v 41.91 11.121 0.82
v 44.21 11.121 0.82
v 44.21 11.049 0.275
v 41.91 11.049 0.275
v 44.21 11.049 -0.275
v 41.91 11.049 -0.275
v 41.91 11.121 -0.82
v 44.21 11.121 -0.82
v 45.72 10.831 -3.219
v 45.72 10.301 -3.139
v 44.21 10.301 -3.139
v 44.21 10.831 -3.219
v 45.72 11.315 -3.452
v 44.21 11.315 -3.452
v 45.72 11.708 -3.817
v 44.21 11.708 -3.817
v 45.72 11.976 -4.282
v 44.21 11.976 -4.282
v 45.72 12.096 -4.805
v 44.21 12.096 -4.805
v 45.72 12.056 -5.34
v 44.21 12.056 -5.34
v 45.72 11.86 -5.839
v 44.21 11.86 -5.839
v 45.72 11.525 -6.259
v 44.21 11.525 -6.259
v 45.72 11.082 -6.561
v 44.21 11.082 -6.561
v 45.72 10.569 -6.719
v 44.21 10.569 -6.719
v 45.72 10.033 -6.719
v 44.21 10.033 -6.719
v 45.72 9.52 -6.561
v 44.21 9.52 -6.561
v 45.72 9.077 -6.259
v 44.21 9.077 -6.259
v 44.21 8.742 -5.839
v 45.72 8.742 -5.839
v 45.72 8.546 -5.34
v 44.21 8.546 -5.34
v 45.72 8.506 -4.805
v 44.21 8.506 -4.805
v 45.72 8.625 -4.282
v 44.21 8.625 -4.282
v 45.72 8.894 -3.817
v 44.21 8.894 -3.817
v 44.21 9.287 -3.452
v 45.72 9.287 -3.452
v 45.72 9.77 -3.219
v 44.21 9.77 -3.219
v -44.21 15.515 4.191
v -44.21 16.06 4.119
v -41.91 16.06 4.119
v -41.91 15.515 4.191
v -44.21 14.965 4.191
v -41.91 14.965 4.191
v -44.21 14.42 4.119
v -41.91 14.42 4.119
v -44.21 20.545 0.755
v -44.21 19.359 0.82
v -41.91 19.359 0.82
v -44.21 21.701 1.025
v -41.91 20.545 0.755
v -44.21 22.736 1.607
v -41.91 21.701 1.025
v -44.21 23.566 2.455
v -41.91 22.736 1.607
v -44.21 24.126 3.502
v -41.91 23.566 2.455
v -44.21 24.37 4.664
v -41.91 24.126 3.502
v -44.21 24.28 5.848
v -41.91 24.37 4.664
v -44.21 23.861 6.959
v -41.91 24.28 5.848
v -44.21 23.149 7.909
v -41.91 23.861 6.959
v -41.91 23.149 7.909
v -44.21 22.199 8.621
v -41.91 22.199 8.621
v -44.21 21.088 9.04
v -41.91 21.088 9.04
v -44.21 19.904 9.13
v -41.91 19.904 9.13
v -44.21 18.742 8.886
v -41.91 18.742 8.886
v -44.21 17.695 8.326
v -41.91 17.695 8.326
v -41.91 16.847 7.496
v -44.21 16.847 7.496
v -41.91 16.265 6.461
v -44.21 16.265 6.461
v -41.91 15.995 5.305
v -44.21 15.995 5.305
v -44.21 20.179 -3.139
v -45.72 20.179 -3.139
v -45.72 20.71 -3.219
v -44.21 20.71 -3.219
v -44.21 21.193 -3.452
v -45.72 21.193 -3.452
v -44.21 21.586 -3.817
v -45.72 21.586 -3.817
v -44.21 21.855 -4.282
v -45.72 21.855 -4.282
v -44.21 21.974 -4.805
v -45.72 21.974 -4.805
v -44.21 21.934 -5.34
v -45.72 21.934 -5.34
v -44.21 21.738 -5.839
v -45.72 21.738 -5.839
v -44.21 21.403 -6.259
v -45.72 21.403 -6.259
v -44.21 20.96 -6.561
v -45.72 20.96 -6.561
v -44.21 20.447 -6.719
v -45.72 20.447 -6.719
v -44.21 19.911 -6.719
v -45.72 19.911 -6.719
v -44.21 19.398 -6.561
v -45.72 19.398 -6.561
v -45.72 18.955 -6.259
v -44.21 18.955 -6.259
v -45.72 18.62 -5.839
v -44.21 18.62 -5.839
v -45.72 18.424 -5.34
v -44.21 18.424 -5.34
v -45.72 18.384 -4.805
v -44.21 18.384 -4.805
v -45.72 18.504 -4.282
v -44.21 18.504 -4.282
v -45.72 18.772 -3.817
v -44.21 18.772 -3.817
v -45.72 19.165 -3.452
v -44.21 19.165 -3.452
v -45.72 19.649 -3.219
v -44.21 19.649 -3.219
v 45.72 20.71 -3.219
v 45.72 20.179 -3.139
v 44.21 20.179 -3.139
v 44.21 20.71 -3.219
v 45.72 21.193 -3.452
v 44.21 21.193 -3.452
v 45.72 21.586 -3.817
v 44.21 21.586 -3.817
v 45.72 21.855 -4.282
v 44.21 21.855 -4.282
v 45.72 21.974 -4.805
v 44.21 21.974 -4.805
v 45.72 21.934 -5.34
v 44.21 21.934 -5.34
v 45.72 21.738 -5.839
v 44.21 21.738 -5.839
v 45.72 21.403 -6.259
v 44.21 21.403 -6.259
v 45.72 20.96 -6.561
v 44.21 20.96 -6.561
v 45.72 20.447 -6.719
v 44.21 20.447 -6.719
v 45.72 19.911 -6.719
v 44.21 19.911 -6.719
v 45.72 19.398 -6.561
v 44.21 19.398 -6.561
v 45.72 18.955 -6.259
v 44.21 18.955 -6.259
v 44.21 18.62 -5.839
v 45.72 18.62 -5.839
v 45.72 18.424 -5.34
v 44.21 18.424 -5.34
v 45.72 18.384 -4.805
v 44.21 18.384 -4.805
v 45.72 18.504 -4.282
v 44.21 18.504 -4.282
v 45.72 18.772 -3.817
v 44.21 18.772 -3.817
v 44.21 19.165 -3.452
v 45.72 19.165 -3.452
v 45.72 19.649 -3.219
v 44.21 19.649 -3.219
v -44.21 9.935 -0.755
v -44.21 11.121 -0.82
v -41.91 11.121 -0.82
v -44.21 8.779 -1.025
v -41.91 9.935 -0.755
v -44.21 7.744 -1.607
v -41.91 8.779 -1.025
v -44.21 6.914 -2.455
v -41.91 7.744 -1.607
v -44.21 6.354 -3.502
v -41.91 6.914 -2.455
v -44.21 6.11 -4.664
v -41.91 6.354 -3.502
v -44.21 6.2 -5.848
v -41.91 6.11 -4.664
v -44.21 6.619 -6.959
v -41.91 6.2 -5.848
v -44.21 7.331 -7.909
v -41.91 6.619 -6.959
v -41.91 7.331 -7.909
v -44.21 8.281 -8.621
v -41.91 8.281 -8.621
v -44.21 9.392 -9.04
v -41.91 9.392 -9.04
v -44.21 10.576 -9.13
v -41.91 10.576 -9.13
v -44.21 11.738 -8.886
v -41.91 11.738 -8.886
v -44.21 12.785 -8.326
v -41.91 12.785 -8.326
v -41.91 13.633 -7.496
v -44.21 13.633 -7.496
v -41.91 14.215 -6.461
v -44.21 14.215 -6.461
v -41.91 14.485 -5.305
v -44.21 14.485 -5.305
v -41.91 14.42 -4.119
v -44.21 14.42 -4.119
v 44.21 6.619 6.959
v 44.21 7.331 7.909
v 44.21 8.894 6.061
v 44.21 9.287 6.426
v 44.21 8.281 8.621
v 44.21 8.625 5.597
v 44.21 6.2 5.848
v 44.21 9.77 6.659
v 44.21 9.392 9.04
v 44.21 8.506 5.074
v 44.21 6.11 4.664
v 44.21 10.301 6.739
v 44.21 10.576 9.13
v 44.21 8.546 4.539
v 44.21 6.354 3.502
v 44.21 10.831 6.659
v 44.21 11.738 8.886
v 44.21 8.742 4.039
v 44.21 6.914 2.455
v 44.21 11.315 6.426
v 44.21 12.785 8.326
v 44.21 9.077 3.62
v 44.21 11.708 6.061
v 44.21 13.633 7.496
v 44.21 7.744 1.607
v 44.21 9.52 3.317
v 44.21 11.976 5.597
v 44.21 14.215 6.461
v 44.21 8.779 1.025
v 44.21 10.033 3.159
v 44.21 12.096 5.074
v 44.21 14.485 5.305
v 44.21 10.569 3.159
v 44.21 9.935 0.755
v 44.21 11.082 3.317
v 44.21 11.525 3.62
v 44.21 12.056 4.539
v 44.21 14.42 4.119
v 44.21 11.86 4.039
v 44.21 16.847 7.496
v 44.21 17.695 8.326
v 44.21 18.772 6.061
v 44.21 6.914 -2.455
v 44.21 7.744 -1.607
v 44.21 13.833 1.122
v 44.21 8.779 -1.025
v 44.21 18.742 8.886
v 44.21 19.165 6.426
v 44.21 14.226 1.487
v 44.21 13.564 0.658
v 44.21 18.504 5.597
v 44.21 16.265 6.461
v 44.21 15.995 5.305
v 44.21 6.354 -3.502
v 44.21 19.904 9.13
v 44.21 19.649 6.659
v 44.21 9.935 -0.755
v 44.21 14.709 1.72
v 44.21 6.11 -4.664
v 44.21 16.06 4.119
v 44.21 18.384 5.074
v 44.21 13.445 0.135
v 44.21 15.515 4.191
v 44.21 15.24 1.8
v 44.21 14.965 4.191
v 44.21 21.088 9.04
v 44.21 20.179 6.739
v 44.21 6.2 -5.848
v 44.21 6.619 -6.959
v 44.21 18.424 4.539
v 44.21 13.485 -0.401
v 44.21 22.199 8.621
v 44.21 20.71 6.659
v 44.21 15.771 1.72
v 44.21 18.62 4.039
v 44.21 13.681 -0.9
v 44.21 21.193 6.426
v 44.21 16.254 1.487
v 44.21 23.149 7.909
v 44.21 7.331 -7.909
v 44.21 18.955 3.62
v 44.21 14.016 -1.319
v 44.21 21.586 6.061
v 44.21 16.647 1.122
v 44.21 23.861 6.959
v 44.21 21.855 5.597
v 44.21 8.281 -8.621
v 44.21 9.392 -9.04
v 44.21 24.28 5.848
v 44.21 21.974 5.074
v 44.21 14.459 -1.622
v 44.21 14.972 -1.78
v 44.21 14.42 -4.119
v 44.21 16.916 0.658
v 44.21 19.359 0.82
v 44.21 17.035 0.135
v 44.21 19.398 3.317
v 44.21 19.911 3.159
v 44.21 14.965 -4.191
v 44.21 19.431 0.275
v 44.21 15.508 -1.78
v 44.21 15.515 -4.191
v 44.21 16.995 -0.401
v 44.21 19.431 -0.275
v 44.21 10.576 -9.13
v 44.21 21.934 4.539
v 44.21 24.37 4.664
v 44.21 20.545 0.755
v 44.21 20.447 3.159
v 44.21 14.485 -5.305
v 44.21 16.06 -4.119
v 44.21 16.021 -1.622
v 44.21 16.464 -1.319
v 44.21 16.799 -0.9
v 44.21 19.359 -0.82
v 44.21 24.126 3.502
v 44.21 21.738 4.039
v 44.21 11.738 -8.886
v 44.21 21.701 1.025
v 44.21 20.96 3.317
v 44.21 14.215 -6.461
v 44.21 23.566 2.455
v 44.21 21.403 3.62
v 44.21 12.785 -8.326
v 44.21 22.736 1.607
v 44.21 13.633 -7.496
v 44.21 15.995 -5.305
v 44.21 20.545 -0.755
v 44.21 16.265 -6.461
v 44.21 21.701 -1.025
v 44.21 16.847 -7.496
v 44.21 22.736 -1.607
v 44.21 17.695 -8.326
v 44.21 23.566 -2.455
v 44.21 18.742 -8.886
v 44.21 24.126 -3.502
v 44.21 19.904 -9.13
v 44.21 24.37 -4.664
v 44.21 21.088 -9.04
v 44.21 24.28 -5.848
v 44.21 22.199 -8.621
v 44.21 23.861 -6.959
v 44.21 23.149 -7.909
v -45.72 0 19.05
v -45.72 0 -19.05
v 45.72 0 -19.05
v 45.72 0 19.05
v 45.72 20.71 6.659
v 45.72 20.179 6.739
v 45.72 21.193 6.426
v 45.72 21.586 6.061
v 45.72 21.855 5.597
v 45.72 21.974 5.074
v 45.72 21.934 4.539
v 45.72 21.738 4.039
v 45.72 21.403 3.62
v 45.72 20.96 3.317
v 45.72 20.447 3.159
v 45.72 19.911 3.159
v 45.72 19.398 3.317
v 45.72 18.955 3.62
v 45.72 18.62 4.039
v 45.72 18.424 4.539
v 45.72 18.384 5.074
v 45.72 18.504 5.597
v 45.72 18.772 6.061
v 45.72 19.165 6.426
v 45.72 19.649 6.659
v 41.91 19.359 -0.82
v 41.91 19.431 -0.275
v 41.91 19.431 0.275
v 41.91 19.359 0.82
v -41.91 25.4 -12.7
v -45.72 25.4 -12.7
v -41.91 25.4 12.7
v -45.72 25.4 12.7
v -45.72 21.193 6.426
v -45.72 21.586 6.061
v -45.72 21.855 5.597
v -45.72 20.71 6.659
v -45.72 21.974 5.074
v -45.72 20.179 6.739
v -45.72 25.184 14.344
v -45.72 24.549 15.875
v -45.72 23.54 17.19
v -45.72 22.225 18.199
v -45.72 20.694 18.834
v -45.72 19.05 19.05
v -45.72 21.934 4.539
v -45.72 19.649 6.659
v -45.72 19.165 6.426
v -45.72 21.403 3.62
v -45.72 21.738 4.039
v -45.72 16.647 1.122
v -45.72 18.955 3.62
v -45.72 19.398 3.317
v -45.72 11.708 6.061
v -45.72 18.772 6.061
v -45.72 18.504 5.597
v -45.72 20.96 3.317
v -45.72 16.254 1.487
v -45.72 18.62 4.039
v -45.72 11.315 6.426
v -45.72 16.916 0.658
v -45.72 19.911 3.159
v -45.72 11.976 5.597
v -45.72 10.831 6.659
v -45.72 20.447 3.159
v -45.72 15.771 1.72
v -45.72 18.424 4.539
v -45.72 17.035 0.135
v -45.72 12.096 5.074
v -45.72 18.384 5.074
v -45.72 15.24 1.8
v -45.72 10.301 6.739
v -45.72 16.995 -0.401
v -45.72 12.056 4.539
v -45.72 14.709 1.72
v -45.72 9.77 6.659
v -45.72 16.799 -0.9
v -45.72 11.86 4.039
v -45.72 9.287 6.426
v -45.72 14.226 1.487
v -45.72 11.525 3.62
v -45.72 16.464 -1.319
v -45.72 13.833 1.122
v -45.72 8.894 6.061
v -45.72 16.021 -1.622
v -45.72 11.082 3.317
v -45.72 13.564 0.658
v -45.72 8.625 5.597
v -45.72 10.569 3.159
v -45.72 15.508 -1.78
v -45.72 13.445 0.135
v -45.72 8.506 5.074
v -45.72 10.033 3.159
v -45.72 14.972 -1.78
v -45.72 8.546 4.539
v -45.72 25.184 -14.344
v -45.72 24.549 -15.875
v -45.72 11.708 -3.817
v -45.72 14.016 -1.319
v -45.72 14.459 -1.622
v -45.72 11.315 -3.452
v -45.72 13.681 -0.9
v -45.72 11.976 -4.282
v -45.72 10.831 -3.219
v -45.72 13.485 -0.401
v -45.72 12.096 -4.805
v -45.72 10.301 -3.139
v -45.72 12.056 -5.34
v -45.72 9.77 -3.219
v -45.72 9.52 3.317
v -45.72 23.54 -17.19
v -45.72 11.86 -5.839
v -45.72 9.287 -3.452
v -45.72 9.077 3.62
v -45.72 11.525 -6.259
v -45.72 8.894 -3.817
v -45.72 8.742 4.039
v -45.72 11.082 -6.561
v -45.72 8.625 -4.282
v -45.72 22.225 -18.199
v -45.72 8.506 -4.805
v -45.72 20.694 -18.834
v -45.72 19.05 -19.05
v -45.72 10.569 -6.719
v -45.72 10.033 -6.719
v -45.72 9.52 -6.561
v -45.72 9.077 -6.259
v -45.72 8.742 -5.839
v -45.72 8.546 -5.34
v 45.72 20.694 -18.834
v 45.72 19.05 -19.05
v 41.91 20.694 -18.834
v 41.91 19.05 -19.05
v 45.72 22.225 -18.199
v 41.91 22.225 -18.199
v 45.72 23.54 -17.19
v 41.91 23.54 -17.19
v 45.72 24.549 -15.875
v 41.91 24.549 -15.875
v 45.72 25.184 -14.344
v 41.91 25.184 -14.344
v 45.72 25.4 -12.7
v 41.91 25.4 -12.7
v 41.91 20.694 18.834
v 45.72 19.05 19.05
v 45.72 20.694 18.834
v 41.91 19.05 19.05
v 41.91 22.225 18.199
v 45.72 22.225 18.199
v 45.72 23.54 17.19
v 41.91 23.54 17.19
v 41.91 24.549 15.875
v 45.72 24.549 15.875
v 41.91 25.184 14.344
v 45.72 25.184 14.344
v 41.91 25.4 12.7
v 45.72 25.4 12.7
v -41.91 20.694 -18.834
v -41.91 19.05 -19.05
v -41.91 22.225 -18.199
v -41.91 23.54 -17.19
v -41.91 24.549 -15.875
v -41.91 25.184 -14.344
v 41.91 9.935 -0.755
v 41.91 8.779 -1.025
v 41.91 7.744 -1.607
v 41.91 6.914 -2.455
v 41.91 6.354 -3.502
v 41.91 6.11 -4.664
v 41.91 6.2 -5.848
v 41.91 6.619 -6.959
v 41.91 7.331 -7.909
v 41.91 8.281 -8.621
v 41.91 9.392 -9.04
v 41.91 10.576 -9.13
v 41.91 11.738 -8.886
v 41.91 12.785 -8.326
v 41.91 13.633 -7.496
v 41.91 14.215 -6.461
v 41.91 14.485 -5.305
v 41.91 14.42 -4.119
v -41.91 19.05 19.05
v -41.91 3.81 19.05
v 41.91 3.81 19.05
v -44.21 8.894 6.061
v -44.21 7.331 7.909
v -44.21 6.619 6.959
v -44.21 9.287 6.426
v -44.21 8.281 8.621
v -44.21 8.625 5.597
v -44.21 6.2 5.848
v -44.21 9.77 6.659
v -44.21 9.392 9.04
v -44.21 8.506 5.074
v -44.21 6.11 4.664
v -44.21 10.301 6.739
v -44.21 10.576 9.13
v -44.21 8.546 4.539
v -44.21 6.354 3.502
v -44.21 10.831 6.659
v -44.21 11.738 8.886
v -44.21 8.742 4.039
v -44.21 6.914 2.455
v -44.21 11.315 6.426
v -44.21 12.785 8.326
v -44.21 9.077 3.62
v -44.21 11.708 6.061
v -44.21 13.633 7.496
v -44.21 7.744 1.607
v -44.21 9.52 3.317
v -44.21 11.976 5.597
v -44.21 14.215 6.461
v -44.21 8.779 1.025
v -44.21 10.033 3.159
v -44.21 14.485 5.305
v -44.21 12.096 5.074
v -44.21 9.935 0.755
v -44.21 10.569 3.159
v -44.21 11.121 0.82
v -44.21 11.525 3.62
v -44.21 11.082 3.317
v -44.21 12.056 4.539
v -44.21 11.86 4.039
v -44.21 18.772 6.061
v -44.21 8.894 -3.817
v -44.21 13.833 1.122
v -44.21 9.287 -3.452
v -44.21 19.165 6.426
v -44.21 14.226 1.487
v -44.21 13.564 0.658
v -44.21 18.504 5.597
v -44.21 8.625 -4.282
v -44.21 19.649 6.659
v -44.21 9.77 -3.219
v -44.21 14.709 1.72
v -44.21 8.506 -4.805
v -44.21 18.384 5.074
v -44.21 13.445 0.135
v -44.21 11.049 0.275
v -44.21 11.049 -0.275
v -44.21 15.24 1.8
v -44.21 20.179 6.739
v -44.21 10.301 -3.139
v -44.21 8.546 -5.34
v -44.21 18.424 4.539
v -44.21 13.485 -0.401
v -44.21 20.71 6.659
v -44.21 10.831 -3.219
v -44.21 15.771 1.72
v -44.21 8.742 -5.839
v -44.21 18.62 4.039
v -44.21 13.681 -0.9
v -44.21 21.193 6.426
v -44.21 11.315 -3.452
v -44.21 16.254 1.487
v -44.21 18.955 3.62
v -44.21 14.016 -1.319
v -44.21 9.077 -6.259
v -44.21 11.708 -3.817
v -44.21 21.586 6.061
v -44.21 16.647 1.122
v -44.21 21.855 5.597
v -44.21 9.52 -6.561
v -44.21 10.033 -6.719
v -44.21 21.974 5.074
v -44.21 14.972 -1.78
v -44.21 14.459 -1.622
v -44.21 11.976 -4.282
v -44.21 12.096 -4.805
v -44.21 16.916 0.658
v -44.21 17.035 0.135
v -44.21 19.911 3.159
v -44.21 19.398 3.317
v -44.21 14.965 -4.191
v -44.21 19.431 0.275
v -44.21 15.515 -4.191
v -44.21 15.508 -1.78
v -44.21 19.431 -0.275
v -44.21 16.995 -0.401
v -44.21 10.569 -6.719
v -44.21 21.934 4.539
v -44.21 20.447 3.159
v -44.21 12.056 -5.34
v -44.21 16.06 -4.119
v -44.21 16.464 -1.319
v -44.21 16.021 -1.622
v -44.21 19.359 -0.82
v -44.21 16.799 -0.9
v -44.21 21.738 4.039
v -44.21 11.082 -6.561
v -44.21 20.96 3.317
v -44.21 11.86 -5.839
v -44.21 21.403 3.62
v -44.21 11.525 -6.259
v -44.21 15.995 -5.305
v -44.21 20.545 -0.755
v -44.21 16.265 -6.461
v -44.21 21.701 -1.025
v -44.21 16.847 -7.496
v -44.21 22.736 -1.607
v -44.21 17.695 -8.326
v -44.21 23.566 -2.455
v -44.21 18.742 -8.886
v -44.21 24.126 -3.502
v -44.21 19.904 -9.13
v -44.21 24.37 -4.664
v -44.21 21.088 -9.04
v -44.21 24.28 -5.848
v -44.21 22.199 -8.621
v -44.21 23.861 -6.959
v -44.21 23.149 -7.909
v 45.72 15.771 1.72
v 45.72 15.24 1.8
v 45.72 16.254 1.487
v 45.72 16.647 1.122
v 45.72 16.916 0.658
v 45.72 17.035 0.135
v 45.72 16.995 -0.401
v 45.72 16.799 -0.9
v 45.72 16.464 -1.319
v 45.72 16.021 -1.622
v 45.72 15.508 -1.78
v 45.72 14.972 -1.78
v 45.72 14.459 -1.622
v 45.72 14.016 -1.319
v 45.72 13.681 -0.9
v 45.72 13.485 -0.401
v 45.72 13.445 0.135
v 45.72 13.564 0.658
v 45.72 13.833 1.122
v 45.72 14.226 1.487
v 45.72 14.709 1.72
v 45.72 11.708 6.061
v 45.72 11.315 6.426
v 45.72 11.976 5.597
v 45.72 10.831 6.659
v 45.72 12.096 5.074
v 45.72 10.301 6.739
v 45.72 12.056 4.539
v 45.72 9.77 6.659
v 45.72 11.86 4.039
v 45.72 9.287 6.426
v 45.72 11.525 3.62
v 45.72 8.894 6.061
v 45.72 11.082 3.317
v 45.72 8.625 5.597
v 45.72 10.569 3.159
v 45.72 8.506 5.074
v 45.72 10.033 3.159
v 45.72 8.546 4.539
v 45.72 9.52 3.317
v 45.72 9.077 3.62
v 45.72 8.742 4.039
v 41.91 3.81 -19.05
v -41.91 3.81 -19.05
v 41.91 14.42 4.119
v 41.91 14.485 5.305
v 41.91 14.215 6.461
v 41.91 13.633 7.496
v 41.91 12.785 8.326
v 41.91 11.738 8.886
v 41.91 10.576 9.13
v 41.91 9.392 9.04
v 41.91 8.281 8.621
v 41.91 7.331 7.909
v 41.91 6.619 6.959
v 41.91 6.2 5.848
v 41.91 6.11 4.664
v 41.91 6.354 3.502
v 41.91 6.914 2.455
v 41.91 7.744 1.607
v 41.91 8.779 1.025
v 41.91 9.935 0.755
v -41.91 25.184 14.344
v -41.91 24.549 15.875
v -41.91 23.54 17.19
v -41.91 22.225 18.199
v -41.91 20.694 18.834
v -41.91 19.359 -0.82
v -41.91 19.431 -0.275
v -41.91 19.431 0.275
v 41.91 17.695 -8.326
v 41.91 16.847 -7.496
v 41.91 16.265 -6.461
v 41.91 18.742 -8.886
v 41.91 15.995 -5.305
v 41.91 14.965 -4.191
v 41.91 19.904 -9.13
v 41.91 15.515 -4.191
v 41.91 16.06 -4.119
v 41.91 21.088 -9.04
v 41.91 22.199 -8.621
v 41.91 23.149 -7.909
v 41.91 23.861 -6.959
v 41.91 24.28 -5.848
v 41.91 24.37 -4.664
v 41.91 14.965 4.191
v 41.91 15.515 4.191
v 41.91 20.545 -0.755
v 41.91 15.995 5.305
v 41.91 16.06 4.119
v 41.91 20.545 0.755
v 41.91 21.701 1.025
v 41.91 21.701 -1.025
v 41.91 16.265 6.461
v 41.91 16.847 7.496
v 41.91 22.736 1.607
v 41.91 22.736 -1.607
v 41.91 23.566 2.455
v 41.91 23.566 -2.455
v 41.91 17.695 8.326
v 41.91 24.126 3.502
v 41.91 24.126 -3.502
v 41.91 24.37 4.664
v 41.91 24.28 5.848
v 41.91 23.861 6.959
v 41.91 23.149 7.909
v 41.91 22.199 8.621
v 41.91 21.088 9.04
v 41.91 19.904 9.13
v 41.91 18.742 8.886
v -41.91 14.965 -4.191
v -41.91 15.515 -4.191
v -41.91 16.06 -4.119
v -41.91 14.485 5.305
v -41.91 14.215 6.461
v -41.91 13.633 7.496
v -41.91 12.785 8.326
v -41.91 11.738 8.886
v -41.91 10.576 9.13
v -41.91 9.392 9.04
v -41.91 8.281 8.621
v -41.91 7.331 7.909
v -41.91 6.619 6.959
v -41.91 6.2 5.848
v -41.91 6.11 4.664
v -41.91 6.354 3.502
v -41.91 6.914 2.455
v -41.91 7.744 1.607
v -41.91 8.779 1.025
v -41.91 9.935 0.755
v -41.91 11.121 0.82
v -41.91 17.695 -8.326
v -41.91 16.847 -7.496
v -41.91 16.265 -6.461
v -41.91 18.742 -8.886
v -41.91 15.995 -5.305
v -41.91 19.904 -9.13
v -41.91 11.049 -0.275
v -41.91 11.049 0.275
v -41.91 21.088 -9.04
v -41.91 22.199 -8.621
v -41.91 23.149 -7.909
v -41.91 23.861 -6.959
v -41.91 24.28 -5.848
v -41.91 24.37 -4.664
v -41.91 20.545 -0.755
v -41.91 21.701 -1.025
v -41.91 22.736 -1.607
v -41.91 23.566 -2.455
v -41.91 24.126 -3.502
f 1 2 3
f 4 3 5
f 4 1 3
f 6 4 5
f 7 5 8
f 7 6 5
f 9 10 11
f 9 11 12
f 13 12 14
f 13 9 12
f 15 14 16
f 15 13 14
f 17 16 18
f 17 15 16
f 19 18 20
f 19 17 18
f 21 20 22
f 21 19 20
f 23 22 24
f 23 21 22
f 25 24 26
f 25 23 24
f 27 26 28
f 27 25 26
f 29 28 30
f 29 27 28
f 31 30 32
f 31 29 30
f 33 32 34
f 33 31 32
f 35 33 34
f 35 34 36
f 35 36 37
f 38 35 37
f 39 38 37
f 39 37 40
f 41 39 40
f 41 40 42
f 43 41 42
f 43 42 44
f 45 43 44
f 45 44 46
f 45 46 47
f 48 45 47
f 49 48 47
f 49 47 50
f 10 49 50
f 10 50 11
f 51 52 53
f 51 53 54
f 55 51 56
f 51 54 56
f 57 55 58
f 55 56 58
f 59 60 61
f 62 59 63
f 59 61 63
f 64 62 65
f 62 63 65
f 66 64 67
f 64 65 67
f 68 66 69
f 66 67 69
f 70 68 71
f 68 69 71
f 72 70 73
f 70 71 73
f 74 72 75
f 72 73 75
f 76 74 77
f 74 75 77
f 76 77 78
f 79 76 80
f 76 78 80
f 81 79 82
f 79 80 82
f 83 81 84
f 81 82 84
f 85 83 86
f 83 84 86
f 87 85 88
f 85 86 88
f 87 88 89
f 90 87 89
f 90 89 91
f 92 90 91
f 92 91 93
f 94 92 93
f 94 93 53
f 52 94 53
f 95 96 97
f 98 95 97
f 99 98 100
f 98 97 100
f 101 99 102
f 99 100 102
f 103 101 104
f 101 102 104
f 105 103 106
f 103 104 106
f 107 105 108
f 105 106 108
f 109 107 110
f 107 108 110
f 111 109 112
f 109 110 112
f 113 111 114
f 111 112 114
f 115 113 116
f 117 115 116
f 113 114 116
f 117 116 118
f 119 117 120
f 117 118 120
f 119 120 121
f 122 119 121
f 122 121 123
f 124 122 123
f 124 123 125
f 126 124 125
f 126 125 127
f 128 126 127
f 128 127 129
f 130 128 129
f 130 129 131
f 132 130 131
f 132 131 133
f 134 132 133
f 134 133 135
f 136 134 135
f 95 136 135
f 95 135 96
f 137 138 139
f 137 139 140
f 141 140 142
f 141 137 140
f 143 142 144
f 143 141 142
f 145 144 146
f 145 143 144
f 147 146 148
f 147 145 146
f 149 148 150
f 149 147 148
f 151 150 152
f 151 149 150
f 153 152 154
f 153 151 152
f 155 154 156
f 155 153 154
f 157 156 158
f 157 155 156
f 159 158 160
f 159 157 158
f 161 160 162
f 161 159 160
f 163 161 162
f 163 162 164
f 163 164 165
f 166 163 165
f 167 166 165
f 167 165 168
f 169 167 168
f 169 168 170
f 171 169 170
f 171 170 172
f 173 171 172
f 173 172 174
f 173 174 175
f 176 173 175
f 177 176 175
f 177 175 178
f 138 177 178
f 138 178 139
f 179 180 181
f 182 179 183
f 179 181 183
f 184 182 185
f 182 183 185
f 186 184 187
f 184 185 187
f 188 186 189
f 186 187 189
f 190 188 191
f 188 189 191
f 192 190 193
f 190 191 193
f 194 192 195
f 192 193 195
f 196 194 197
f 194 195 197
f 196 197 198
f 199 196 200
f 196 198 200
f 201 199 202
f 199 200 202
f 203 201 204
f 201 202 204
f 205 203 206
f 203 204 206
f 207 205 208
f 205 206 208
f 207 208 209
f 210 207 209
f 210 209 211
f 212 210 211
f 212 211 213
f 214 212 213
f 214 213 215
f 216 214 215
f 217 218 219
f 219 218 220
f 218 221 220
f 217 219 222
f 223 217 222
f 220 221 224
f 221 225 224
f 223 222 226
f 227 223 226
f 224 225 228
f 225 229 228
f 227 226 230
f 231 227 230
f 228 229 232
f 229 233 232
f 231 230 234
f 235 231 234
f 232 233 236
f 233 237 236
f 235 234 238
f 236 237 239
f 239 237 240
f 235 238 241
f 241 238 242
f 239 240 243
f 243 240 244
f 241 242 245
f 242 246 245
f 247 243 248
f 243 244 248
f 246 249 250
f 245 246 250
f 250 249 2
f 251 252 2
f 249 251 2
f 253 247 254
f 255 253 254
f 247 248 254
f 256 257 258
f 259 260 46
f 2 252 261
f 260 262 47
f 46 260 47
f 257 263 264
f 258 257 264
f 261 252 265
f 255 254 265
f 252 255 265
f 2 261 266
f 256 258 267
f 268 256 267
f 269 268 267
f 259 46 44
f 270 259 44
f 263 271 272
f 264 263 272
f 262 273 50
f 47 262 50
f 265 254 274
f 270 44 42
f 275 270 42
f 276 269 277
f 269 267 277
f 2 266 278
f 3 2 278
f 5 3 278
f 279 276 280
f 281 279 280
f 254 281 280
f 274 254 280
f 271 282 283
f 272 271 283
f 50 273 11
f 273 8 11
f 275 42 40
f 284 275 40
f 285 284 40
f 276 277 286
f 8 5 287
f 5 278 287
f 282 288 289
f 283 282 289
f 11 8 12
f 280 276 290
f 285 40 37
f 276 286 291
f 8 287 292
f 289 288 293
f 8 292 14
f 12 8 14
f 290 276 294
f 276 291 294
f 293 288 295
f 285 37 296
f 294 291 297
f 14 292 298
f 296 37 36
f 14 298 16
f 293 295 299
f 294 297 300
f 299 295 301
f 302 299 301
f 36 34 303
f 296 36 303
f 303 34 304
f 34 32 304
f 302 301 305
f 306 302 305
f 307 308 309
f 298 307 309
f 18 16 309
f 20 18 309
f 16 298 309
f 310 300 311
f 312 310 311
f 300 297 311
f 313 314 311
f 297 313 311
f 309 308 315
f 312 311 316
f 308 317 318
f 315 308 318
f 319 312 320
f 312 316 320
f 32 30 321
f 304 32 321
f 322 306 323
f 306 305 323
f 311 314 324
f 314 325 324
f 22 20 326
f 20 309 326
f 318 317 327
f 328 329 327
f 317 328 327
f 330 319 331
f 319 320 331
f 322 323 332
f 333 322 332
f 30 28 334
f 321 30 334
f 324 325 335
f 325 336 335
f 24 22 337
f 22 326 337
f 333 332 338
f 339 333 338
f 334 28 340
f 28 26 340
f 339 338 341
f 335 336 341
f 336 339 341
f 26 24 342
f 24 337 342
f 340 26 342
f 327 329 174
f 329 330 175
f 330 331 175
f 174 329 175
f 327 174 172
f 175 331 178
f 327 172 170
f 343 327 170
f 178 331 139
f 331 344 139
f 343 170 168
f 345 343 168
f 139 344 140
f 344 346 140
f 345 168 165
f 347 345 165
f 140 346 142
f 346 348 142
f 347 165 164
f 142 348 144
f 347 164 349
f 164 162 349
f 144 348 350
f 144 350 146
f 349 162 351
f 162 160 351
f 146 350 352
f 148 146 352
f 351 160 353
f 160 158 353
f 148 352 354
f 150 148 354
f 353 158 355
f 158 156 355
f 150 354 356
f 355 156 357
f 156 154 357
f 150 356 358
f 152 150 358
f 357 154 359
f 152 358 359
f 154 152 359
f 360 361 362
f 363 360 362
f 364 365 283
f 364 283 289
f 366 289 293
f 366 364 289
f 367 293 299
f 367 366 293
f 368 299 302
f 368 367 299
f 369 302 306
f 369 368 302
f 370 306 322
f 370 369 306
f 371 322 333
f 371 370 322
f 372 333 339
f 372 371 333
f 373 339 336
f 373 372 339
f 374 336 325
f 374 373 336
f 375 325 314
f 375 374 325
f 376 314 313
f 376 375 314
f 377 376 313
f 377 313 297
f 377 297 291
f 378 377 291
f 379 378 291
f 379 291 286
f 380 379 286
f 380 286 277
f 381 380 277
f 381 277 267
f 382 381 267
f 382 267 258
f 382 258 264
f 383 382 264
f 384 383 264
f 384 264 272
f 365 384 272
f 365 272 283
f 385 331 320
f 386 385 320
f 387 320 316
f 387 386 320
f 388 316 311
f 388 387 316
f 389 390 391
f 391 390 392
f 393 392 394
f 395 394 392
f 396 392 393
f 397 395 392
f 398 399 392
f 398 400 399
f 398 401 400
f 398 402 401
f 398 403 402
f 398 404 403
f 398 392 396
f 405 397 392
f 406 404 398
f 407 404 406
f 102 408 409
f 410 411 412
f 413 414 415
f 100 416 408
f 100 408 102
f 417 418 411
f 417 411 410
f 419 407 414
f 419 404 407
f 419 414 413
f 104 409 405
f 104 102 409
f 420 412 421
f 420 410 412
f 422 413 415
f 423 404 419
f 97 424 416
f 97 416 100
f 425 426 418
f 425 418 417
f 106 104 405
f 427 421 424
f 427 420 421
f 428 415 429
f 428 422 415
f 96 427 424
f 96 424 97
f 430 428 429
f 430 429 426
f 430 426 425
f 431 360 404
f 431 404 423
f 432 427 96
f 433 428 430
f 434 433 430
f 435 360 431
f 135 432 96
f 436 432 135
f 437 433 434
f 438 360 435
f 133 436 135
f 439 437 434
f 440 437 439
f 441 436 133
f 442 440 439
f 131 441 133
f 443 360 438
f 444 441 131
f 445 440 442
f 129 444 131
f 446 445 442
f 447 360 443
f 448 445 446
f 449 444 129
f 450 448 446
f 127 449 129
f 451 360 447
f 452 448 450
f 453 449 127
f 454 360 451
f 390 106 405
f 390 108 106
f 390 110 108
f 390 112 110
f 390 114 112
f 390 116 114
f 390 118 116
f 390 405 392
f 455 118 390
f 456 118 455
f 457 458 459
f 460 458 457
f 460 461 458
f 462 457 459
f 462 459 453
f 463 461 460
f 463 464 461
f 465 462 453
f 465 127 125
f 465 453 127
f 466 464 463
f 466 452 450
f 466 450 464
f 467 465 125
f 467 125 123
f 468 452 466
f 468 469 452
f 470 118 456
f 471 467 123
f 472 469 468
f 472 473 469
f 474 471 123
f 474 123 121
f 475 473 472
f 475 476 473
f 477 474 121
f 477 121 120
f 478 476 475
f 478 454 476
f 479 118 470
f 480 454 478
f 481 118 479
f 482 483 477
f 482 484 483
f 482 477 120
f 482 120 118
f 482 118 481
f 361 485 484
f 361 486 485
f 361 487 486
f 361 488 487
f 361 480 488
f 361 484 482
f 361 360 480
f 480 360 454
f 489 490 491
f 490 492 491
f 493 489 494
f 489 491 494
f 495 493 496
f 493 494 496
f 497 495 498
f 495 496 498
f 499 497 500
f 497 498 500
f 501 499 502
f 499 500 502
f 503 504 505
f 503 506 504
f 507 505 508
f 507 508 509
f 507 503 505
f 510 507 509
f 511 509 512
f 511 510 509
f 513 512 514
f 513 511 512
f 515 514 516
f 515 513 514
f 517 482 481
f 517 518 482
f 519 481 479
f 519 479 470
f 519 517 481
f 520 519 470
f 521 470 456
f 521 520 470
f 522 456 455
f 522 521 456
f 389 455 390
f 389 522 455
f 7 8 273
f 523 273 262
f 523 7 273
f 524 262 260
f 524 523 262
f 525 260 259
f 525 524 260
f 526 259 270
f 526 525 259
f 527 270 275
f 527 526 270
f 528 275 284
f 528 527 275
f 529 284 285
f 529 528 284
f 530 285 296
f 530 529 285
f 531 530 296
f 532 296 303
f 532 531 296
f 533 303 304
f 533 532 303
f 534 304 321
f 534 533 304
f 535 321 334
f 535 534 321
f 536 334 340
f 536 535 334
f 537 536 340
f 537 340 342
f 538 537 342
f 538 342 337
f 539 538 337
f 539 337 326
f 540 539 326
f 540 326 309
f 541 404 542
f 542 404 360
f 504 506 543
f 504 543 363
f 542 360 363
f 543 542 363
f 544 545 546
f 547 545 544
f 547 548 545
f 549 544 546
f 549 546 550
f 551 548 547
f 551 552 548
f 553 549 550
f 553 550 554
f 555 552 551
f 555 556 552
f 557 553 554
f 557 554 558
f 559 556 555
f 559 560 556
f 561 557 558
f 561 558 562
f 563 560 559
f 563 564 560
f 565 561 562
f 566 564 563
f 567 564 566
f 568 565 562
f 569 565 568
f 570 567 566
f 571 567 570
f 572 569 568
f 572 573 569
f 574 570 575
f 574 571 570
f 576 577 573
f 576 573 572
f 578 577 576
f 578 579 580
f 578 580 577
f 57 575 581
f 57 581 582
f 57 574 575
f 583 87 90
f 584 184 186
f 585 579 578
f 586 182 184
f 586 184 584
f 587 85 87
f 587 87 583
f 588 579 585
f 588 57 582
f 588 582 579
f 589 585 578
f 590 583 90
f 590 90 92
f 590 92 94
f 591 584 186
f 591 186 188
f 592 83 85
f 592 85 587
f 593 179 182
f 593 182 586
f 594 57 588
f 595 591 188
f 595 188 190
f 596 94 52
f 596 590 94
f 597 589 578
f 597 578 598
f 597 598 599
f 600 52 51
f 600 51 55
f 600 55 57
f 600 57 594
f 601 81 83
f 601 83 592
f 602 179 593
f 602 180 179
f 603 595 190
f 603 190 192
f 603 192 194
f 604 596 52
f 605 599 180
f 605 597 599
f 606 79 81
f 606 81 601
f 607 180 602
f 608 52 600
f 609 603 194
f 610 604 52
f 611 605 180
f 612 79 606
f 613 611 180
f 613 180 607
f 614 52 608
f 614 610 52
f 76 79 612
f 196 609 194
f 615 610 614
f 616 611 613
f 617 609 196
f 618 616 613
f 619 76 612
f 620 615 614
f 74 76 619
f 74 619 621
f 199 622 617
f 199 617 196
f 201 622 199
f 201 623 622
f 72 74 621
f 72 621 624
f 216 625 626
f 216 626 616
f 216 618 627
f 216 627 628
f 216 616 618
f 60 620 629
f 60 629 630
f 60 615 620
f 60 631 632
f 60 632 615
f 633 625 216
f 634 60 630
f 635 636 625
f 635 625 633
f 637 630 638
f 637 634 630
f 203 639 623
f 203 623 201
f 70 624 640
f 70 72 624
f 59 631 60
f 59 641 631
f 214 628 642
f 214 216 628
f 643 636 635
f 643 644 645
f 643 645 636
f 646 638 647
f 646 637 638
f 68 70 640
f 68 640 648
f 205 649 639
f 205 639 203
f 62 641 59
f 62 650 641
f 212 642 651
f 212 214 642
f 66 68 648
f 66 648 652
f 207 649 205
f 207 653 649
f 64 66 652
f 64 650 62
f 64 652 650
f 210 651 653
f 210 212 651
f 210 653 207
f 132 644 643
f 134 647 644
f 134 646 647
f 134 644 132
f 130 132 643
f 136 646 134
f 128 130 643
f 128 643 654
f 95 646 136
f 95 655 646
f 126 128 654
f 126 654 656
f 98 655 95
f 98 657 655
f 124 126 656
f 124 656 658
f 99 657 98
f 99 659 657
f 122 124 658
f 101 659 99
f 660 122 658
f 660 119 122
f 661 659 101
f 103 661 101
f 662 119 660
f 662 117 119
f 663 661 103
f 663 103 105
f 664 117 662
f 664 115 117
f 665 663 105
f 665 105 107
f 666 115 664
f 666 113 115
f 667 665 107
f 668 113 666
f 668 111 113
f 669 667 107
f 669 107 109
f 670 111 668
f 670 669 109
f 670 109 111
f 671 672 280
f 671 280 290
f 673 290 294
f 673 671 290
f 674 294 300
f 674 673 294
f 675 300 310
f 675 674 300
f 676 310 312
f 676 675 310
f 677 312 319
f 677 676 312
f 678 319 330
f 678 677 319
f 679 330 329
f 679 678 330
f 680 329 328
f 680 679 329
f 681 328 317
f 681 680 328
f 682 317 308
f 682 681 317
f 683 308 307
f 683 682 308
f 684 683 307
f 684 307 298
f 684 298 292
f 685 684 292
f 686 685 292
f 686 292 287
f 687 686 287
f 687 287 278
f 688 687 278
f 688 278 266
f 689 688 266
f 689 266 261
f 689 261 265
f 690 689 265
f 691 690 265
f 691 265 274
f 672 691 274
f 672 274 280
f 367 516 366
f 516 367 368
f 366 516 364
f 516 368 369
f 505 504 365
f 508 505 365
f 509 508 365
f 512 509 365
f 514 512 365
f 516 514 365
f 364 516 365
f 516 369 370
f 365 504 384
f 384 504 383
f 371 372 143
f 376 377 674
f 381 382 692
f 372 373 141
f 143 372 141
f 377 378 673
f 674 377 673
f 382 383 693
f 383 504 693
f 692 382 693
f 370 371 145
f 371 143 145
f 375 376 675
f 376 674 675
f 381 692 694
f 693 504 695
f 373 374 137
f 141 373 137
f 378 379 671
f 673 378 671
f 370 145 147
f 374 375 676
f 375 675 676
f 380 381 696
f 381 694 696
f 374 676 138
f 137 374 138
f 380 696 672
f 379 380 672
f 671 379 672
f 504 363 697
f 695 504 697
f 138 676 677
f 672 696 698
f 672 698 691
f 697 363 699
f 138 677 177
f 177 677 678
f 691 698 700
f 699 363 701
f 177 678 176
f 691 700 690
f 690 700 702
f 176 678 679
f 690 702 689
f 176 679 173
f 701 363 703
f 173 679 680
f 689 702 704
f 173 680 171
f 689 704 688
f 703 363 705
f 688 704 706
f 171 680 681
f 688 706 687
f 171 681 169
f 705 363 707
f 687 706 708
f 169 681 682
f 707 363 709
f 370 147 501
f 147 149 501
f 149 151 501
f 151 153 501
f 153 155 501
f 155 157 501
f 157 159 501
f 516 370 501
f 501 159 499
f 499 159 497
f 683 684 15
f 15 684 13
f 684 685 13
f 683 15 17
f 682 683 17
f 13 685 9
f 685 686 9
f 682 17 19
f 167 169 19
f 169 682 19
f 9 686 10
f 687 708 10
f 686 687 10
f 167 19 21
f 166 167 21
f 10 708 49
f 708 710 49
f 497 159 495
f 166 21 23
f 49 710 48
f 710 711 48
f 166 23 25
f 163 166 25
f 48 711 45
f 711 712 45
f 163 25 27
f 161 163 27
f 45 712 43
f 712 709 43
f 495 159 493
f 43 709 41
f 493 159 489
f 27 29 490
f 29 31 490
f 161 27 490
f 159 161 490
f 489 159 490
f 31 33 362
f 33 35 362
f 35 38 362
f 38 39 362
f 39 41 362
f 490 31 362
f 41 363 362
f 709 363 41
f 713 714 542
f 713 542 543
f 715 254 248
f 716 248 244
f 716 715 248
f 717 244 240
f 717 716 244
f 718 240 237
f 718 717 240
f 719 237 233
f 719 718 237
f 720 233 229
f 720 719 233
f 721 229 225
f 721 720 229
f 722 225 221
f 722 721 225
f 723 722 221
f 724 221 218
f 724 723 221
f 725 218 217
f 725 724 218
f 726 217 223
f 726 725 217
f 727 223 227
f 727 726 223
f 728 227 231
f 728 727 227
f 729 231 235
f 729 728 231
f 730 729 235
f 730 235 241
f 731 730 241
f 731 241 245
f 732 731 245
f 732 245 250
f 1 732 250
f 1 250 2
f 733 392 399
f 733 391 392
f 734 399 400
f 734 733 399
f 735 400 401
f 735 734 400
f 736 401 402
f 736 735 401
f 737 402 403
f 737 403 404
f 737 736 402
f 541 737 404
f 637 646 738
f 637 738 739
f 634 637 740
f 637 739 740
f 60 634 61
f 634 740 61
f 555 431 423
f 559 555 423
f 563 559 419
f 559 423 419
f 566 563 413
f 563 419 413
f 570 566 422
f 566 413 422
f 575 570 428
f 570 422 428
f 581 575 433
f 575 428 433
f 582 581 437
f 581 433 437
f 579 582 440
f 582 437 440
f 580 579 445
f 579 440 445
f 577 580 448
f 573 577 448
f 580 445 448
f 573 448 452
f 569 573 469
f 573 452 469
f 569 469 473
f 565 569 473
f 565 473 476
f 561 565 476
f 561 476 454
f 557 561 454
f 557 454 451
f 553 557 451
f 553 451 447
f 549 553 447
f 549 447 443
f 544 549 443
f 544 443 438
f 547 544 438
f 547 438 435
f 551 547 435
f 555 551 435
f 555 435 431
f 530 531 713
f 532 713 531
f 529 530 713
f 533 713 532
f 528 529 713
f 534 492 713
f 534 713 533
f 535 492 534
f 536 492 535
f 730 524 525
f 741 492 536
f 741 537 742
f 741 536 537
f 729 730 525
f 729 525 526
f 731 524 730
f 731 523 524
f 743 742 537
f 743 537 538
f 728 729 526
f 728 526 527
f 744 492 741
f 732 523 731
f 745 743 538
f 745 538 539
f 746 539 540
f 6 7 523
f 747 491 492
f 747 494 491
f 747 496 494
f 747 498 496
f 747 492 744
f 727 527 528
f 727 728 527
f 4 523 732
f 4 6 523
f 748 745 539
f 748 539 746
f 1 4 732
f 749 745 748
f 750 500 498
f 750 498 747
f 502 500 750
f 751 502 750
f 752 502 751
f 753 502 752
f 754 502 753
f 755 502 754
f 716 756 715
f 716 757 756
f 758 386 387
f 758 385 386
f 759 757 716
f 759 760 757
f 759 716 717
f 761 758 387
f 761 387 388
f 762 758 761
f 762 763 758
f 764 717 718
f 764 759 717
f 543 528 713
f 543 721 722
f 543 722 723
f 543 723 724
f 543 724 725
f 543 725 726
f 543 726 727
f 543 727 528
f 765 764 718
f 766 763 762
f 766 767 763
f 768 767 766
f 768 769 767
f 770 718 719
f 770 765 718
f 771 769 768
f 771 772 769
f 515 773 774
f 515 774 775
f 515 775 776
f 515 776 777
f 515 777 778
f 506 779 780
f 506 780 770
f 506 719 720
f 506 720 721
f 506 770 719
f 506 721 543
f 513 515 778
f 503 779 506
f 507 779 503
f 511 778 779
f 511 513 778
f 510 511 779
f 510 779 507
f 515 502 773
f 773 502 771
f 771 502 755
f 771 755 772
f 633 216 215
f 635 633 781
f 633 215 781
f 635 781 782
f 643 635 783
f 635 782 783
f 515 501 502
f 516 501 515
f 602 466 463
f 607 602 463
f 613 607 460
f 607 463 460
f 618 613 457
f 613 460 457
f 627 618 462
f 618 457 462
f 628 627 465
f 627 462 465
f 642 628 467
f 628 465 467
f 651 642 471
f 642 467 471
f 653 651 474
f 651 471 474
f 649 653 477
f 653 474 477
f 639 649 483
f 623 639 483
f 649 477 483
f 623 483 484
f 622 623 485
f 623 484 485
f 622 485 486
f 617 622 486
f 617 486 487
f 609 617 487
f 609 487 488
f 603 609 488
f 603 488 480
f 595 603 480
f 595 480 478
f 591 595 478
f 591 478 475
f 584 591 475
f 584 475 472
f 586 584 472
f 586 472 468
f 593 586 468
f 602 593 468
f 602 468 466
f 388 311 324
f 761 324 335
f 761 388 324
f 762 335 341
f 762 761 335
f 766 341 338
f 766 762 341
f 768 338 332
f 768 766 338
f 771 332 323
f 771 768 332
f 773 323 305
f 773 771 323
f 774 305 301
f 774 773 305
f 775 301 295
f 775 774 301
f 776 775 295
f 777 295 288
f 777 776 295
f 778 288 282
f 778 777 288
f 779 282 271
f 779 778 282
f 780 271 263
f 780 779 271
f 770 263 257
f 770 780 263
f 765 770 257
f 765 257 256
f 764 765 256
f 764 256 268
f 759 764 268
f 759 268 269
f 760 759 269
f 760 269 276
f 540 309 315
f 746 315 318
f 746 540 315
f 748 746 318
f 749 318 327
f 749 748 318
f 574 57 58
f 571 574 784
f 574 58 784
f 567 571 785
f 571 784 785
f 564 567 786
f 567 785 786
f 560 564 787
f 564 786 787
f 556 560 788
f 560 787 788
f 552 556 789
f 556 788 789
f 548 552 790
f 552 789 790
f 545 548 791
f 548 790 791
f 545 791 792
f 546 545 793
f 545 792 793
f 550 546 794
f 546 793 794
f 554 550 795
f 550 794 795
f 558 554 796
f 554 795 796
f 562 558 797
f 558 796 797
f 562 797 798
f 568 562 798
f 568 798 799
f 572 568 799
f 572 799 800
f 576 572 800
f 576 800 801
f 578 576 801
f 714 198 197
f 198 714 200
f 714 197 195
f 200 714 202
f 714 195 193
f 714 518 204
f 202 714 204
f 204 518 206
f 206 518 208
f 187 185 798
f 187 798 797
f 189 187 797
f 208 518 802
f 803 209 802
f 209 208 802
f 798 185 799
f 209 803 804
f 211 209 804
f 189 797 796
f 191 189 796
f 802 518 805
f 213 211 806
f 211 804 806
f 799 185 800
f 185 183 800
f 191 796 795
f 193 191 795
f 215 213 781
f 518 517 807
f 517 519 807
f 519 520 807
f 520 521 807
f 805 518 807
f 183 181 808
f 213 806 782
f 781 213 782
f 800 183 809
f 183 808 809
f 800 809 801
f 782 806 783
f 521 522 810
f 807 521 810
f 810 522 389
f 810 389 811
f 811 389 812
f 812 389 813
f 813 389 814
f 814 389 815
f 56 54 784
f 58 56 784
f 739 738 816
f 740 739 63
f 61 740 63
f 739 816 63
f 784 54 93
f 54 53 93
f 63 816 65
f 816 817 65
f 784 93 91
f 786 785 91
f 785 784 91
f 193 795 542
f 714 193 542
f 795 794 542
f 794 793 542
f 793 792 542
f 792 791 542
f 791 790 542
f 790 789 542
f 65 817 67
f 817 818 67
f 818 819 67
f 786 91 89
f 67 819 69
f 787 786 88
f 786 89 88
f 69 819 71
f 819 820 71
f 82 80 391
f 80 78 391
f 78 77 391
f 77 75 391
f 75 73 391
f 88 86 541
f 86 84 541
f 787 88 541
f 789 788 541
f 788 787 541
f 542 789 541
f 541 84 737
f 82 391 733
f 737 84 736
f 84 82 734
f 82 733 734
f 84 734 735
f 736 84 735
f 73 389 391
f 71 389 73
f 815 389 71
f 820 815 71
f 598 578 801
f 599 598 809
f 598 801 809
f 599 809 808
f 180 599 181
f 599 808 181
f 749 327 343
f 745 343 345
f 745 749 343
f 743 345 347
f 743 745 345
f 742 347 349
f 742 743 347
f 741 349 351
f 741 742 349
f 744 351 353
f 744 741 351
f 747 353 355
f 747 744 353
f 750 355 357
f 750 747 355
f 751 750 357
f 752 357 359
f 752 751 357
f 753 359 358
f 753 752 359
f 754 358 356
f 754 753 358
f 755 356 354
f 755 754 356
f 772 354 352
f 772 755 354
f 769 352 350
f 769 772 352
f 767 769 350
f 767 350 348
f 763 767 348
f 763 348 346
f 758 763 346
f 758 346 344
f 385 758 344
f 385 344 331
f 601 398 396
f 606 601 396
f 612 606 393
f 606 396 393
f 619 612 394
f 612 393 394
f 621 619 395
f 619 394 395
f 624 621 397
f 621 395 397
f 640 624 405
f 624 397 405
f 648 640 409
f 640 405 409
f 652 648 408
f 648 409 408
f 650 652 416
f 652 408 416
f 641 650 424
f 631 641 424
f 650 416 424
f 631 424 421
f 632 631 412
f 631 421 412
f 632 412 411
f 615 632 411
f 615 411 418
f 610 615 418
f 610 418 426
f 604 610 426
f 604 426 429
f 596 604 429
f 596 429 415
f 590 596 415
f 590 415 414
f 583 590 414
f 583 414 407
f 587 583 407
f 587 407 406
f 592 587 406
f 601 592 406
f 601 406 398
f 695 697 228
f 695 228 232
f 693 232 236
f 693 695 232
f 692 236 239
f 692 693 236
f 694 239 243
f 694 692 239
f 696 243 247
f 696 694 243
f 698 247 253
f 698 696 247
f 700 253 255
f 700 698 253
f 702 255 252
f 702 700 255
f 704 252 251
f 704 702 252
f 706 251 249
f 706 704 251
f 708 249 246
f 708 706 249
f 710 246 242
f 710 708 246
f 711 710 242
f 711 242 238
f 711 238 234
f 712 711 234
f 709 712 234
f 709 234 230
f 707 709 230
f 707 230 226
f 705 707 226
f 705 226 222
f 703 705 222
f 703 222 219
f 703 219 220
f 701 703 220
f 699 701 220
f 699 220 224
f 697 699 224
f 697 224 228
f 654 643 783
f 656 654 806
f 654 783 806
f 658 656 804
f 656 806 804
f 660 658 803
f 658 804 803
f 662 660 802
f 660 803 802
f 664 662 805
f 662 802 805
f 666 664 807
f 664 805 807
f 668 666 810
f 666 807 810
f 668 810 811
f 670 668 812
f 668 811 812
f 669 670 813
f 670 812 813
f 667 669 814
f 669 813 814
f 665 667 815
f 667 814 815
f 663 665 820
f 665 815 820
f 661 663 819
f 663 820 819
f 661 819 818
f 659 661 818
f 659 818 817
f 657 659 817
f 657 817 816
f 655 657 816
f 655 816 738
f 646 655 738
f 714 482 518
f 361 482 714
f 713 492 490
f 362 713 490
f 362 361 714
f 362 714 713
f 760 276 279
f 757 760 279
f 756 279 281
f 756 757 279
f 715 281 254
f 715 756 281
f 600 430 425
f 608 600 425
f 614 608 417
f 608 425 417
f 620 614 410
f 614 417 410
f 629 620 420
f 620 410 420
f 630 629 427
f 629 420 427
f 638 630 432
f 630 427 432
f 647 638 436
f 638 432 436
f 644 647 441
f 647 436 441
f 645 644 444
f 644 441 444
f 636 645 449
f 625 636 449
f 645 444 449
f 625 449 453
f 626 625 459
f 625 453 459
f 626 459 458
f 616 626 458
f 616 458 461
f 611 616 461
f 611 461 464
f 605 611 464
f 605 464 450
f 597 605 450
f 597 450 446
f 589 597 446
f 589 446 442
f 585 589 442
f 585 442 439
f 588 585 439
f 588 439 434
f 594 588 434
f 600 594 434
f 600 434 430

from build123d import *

# Parameters (mm, degrees)
SKETCH1_W                                        = 91.44
SKETCH1_H                                        = 38.1
BOSS_EXTRUDE1_DEPTH                              = 3.81
SKETCH2_W                                        = 38.1
SKETCH2_H                                        = 25.4
BOSS_EXTRUDE2_DEPTH                              = 3.81
CBORE_FOR_M3_HEX_HEAD_MACHINE_SCREW1_D           = 3.6
CBORE_FOR_M3_HEX_HEAD_MACHINE_SCREW1_DEPTH       = 3.81
CBORE_FOR_M3_HEX_HEAD_MACHINE_SCREW1_CBORE_D     = 8.4
CBORE_FOR_M3_HEX_HEAD_MACHINE_SCREW1_CBORE_DEPTH = 2.3
FILLET1_R                                        = 6.35
FILLET1_OF_MIRROR1_R                             = 6.35


with BuildPart() as part:
    # Sketch1 → Boss-Extrude1 (new body)
    with BuildSketch(Plane(origin=(0, 0, 0), x_dir=(1, 0, 0), z_dir=(0, 1, 0))):
        Rectangle(SKETCH1_W, SKETCH1_H)
    extrude(amount=BOSS_EXTRUDE1_DEPTH)

    # Sketch2 → Boss-Extrude2 (add)
    with BuildSketch(Plane.ZY.offset(45.72)):
        with Locations((0, 12.7)):
            Rectangle(SKETCH2_W, SKETCH2_H)
    boss_extrude2 = extrude(amount=-BOSS_EXTRUDE2_DEPTH)

    # CBORE for M3 Hex Head Machine Screw1
    with Locations(Plane(origin=(-41.91, 0, 0), x_dir=(0, 0, -1), z_dir=(1, 0, 0))):
        with Locations((-4.939140867, 20.179140867), (4.939140867, 20.179140867), (0, 15.24), (-4.939140867, 10.300859133), (4.939140867, 10.300859133)):
            cbore_for_m3_hex_head_machine_screw1 = CounterBoreHole(CBORE_FOR_M3_HEX_HEAD_MACHINE_SCREW1_D / 2, CBORE_FOR_M3_HEX_HEAD_MACHINE_SCREW1_CBORE_D / 2, CBORE_FOR_M3_HEX_HEAD_MACHINE_SCREW1_CBORE_DEPTH, depth=CBORE_FOR_M3_HEX_HEAD_MACHINE_SCREW1_DEPTH)

    # Fillet1
    fillet1_edges = [part.edges().sort_by_distance(p)[0] for p in [
        (-43.815, 25.4, -19.05),
        (-43.815, 25.4, 19.05),
    ]]
    fillet(fillet1_edges, radius=FILLET1_R)

    # Mirror1: Boss-Extrude2, CBORE for M3 Hex Head Machine Screw1 across plane
    add(boss_extrude2.mirror(Plane(origin=(0, 0, 0), x_dir=(0, 0, 1), z_dir=(1, 0, 0))))
    add(cbore_for_m3_hex_head_machine_screw1.mirror(Plane(origin=(0, 0, 0), x_dir=(0, 0, 1), z_dir=(1, 0, 0))), mode=Mode.SUBTRACT)

    # Fillet1 of Mirror1
    fillet1_of_mirror1_edges = [part.edges().sort_by_distance(p)[0] for p in [
        (43.815, 25.4, -19.05),
        (43.815, 25.4, 19.05),
    ]]
    fillet(fillet1_of_mirror1_edges, radius=FILLET1_OF_MIRROR1_R)


solid = part.part
